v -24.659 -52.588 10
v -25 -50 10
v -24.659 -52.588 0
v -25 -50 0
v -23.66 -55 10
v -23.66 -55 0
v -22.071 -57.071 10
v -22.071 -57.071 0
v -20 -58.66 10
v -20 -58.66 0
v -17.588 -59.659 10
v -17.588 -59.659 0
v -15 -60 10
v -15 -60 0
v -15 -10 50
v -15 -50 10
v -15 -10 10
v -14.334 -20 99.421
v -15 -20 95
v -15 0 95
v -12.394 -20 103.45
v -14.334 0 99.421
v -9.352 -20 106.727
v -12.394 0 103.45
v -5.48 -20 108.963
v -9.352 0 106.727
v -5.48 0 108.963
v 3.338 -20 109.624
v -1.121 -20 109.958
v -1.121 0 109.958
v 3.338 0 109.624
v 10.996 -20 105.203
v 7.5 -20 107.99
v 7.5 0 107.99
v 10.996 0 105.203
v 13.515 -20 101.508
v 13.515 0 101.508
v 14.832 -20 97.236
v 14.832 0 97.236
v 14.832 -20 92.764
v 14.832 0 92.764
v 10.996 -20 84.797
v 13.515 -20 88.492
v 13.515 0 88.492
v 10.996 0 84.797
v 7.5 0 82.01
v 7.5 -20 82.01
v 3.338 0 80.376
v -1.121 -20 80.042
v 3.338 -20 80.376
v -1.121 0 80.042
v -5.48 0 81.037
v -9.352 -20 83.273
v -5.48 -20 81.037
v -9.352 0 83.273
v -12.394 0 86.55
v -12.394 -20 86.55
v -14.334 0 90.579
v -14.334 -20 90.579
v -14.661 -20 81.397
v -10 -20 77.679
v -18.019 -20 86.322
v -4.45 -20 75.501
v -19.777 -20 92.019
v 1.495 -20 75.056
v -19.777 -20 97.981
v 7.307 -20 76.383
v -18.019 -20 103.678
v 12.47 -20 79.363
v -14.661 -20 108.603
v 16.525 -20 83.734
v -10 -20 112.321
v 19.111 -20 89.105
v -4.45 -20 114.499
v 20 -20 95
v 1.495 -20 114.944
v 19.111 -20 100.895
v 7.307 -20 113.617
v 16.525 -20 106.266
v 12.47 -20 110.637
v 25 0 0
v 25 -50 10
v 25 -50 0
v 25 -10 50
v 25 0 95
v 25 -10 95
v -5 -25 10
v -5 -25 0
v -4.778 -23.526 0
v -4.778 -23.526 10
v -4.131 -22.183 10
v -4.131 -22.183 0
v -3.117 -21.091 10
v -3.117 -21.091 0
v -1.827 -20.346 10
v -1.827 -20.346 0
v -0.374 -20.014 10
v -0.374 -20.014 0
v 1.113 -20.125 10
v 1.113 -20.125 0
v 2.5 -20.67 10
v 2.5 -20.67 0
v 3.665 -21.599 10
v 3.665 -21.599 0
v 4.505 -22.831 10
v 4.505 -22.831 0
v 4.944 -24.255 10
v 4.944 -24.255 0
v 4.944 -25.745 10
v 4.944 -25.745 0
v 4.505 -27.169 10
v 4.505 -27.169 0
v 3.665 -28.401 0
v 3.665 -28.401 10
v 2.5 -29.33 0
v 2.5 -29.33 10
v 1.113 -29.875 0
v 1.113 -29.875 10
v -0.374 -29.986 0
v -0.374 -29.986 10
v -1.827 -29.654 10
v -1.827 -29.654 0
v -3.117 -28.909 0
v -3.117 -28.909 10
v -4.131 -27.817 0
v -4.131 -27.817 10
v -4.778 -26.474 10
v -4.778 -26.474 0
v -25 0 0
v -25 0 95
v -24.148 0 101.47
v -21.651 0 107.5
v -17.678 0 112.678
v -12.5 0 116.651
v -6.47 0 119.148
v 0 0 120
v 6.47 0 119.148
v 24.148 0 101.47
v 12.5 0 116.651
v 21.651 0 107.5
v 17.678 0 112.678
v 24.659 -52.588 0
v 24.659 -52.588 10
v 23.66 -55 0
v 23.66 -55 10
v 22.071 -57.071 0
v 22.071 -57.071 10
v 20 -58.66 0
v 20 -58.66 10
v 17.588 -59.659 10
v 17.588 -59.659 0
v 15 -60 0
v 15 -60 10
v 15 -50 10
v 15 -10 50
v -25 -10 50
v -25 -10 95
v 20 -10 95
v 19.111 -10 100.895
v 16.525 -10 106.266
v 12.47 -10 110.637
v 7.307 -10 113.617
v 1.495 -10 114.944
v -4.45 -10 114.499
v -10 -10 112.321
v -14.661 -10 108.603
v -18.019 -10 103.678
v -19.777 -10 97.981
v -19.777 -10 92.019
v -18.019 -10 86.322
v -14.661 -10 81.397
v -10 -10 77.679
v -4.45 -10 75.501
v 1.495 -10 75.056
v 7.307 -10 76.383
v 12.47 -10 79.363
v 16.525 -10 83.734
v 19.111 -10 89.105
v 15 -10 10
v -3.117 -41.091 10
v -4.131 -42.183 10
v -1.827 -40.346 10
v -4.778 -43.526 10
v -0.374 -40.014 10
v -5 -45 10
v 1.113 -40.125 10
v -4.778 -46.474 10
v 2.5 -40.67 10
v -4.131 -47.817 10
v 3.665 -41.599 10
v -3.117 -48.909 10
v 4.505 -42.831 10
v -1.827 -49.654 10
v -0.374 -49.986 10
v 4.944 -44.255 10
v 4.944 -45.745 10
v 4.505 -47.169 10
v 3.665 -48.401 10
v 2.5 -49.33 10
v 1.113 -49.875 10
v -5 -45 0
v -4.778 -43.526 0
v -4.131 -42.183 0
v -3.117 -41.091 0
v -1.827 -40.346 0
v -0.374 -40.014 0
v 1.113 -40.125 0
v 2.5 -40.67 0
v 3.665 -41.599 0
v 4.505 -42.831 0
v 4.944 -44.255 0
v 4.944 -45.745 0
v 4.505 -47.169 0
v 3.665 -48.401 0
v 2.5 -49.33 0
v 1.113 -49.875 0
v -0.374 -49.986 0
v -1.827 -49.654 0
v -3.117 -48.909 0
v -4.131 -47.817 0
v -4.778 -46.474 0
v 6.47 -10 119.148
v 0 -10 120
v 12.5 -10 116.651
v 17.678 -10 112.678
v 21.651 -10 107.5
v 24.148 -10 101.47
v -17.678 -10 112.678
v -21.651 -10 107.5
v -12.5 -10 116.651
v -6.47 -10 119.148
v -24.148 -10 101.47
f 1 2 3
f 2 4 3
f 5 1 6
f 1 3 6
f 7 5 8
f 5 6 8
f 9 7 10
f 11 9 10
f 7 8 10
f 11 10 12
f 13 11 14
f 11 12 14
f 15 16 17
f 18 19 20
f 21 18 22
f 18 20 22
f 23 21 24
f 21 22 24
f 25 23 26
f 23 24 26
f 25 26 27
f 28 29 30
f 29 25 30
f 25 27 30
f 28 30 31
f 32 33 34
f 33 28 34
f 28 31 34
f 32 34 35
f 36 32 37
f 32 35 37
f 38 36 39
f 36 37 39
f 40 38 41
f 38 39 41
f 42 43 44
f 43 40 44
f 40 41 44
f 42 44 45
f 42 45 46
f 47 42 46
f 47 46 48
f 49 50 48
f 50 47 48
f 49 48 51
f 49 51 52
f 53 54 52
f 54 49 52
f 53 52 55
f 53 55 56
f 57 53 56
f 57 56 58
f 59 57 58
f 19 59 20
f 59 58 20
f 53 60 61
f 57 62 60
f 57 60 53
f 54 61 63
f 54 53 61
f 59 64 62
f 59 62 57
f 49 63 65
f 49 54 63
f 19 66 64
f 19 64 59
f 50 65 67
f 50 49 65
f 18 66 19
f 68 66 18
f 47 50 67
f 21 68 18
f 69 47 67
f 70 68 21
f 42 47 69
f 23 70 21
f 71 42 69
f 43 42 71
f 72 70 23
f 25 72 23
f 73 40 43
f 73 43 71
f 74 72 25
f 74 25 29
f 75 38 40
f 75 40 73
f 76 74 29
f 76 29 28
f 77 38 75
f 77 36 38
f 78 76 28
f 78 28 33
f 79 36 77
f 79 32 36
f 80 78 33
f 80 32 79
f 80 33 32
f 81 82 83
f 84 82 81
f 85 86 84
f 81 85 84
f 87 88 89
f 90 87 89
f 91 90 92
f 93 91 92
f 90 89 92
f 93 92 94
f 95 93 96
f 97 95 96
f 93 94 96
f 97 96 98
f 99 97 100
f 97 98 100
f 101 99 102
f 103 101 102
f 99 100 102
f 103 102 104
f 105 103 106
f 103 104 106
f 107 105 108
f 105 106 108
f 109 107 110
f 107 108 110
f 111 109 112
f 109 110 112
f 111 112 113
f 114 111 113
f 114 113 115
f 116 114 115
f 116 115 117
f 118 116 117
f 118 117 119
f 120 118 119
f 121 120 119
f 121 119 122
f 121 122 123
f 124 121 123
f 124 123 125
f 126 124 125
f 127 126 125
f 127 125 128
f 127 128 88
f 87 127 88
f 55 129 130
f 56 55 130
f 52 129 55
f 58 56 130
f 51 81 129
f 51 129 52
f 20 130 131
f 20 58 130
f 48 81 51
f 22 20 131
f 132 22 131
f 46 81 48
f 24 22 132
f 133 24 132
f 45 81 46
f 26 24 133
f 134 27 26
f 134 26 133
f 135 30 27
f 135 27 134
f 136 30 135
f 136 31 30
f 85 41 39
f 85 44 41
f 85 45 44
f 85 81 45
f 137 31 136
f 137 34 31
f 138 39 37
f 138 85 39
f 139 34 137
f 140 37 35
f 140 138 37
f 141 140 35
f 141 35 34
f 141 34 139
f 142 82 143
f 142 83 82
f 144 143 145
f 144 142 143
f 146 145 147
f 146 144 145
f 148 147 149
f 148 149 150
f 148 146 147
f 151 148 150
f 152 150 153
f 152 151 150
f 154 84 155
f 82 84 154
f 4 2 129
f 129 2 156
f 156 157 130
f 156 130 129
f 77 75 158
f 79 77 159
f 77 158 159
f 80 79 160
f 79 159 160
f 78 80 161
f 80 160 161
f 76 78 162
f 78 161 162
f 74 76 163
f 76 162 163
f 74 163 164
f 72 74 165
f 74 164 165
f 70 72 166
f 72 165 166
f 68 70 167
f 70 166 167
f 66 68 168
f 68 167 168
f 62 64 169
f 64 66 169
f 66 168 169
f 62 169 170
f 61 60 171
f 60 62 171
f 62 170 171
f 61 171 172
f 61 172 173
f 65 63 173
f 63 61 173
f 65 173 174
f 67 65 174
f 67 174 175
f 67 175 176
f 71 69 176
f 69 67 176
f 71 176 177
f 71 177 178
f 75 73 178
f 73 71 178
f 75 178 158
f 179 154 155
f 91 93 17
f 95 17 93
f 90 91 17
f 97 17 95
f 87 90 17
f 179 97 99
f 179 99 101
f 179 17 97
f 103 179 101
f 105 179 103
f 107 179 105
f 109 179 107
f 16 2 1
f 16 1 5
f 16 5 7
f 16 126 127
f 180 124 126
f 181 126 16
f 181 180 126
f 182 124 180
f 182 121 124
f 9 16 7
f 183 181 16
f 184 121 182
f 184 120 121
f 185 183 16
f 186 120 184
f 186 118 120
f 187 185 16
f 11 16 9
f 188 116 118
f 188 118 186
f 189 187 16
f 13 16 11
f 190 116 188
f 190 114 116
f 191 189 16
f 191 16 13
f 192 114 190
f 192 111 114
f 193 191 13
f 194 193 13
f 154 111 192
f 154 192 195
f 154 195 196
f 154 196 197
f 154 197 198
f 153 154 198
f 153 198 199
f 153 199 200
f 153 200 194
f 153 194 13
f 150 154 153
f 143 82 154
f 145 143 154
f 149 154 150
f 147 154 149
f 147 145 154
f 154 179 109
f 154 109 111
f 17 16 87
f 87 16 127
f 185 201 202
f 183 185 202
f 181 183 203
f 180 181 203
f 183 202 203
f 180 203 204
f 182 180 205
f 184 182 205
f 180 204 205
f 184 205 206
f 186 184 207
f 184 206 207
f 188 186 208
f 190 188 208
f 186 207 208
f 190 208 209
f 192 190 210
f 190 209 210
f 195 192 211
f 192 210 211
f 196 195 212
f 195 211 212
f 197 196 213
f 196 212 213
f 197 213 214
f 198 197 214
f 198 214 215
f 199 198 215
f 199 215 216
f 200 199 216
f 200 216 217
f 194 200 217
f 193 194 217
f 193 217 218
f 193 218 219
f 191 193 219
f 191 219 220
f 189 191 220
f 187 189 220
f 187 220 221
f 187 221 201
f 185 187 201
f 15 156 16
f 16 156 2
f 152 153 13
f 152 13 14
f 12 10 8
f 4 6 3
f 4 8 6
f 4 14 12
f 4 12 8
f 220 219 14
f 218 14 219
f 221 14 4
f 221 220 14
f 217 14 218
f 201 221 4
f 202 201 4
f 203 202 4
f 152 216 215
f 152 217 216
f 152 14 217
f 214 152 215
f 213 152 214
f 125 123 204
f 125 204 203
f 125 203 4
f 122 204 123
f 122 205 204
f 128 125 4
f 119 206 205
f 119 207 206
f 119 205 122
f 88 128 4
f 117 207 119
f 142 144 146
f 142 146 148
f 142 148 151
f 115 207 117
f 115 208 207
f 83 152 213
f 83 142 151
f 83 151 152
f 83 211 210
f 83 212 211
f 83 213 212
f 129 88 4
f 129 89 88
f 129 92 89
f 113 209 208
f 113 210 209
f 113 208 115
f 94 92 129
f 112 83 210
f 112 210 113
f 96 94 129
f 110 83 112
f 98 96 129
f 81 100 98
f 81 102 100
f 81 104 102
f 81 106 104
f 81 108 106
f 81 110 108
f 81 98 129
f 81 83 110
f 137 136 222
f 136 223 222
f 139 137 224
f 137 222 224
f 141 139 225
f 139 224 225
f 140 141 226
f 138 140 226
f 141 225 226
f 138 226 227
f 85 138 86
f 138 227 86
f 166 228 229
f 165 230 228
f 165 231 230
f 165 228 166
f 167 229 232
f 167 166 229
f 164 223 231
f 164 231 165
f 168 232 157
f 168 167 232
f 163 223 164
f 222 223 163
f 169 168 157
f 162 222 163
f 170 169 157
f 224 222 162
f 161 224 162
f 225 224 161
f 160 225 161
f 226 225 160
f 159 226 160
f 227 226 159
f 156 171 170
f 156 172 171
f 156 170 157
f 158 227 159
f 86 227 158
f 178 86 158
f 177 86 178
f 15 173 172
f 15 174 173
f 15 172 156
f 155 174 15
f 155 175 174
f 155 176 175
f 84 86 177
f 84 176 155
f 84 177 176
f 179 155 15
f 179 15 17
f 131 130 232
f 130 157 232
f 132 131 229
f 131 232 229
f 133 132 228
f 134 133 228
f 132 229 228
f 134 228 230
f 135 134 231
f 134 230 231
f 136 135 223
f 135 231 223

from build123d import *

# Parameters (mm, degrees)
F1_DEPTH = 25
F3_DEPTH = 10
F4_R     = 20
F5_DEPTH = 10
F6_R     = 24.99999
F8_D     = 30
F9_R     = 10
F11_D    = 10


# Not quite as in the source:
# - a fillet or chamfer is up to 0.001 mm smaller than in the source, because OpenCascade refuses the exact size
# - a pattern or mirror of a feature is missing from the dataset's text; its kind, count and spacing are read off the source's solid


with BuildPart() as f1:
    # F0 (on Right) → F1 (new body, symmetric)
    with BuildSketch(Plane.YZ):
        Polygon((-60, 0), (0, 0), (0, 120), (-10, 120), (-10, 10), (-60, 10), align=None)
    extrude(amount=F1_DEPTH, both=True)

    # F2 (on face) → F3 (join)
    with BuildSketch(Plane.YZ.offset(25)):
        Polygon((-50, 10), (-10, 10), (-10, 50), align=None)
    f3 = extrude(amount=-F3_DEPTH)

    # F3_copies: F3 across plane
    add(f3.mirror(Plane(origin=(0, 0, 0), x_dir=(0, 0, -1), z_dir=(-1, 0, 0))))

    # F4 (on face) → F5 (join)
    with BuildSketch(Plane.XZ.offset(10)):
        with Locations((0, 95)):
            Circle(F4_R)
    extrude(amount=F5_DEPTH)

    # F6 (radius 25 in the source; OpenCascade refuses exactly that, so slightly less here)
    f6_edges = [f1.edges().sort_by_distance(p)[0] for p in [
        (-25, -5, 120),
        (25, -5, 120),
    ]]
    fillet(f6_edges, radius=F6_R)

    # F8 (through all)
    with Locations(Plane.XZ.offset(20)):
        with Locations((0, 95)):
            Hole(F8_D / 2)

    # F9
    f9_edges = [f1.edges().sort_by_distance(p)[0] for p in [
        (-25, -60, 5),
        (25, -60, 5),
    ]]
    fillet(f9_edges, radius=F9_R)

    # F11 (through all)
    with Locations(Plane.XY.offset(10)):
        with Locations((0, -25), (0, -45)):
            Hole(F11_D / 2)


solid = f1.part
